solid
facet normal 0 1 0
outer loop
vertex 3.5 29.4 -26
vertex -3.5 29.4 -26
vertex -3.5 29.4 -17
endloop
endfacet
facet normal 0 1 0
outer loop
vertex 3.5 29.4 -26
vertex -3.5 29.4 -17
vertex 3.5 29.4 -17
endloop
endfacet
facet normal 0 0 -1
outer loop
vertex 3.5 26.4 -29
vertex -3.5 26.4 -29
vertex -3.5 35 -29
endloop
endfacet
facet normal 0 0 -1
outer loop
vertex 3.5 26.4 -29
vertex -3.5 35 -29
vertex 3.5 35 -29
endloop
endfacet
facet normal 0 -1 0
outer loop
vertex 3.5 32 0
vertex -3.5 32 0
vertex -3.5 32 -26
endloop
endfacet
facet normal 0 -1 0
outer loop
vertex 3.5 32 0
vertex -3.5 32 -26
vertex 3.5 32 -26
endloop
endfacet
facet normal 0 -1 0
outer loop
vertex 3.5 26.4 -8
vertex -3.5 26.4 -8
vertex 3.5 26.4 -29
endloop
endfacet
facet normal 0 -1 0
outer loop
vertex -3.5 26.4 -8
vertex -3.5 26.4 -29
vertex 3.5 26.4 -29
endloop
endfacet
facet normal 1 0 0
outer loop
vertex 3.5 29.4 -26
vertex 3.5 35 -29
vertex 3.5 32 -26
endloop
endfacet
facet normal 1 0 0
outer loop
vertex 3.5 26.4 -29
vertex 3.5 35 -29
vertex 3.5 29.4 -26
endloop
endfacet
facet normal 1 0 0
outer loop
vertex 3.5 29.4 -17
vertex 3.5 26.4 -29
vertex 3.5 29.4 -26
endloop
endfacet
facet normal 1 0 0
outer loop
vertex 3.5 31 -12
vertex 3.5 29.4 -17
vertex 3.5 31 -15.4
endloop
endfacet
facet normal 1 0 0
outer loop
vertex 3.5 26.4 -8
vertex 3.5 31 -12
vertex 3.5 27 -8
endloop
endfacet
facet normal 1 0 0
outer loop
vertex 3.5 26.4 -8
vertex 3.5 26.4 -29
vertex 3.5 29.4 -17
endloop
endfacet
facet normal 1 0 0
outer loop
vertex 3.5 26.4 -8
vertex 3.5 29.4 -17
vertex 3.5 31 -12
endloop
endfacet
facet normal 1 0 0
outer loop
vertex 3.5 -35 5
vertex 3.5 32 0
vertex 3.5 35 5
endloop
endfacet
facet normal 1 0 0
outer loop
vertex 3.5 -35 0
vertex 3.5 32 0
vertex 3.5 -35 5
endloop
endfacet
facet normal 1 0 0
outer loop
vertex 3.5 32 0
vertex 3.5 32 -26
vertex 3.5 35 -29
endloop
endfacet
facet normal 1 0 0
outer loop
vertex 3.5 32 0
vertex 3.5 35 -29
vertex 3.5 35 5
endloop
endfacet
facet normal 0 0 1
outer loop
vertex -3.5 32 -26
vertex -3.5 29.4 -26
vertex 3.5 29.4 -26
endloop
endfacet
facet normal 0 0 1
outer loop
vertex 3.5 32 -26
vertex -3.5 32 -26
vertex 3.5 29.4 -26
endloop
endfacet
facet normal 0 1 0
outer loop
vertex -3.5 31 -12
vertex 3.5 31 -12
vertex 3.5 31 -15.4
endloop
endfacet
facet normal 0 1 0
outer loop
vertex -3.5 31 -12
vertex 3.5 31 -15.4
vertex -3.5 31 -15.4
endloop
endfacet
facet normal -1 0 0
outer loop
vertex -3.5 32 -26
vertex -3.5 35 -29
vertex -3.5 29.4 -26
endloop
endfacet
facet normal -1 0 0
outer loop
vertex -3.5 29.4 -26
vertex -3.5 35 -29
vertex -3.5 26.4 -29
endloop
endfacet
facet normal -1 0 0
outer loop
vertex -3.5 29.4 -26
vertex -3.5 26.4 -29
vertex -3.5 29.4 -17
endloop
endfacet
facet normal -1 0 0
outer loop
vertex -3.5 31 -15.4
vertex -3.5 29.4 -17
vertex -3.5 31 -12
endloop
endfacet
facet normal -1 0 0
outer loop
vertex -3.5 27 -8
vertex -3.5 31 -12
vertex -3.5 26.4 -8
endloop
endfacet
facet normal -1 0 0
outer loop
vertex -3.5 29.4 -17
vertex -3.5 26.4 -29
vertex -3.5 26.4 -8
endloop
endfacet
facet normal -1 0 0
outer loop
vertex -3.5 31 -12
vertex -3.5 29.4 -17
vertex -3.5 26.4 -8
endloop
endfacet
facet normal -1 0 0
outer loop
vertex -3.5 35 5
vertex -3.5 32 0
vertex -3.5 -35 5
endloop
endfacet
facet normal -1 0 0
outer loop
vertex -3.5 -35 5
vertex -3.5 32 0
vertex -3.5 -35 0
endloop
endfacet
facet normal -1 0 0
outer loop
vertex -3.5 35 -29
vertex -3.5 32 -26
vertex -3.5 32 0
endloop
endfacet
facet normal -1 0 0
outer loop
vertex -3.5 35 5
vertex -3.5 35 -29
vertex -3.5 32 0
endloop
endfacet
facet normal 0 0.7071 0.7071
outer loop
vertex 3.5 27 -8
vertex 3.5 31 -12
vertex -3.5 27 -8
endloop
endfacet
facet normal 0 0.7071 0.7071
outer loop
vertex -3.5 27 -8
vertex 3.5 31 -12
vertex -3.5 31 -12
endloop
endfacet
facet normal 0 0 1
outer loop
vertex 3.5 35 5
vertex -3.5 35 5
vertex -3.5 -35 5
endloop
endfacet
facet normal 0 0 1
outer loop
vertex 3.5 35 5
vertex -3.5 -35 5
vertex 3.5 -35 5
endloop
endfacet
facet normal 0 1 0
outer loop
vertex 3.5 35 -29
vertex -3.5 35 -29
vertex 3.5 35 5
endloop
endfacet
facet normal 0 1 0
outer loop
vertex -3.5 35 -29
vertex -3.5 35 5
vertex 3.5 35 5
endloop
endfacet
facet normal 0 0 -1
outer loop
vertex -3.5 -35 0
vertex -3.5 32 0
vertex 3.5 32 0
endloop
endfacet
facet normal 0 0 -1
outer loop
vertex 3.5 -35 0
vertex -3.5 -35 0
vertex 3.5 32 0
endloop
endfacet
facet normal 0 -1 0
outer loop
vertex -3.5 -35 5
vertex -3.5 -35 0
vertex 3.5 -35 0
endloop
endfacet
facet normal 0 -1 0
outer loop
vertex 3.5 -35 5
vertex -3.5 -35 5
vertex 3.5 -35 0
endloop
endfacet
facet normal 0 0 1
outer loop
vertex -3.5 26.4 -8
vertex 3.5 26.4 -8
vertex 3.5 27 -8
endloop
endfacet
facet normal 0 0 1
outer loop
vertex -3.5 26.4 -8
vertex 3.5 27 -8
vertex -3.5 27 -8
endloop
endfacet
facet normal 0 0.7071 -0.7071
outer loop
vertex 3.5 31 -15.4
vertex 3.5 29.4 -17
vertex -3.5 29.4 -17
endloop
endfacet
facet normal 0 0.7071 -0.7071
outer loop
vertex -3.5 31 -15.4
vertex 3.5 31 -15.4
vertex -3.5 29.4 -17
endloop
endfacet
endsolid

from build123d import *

# Parameters (mm, degrees)
F0_W     = 7
F0_H     = 70
F1_DEPTH = 5
F2_W     = 7
F2_H     = 3
F3_DEPTH = 26
F4_W     = 7
F4_H     = 8.6
F5_DEPTH = 3
F6_W     = 7
F6_H     = 3
F7_DEPTH = 18
F8_W     = 7
F8_H     = 9
F9_DEPTH = 1.6
F10_SIZE = 4
F11_SIZE = 1.59999


# Not quite as in the source:
# - a fillet or chamfer is up to 0.001 mm smaller than in the source, because OpenCascade refuses the exact size


with BuildPart() as f1:
    # F0 (on Top) → F1 (new body)
    with BuildSketch(Plane.XY):
        Rectangle(F0_W, F0_H)
    extrude(amount=F1_DEPTH)

    # F2 (on face) → F3 (join)
    with BuildSketch(Plane(origin=(0, 0, 0), x_dir=(1, 0, 0), z_dir=(0, 0, -1))):
        with Locations((0, -33.5)):
            Rectangle(F2_W, F2_H)
    extrude(amount=F3_DEPTH)

    # F4 (on face) → F5 (join)
    with BuildSketch(Plane(origin=(0, 0, -26), x_dir=(1, 0, 0), z_dir=(0, 0, -1))):
        with Locations((0, -30.7)):
            Rectangle(F4_W, F4_H)
    extrude(amount=F5_DEPTH)

    # F6 (on face) → F7 (join)
    with BuildSketch(Plane.XY.offset(-26)):
        with Locations((0, 27.9)):
            Rectangle(F6_W, F6_H)
    extrude(amount=F7_DEPTH)

    # F8 (on face) → F9 (join)
    with BuildSketch(Plane(origin=(0, 29.4, 0), x_dir=(-1, 0, 0), z_dir=(0, 1, 0))):
        with Locations((0, -12.5)):
            Rectangle(F8_W, F8_H)
    extrude(amount=F9_DEPTH)

    # F10
    f10_edges = [f1.edges().sort_by_distance(p)[0] for p in [
        (0, 31, -8),
    ]]
    chamfer(f10_edges, length=F10_SIZE)

    # F11 (size 1.6 in the source; OpenCascade refuses exactly that, so slightly less here)
    f11_edges = [f1.edges().sort_by_distance(p)[0] for p in [
        (0, 31, -17),
    ]]
    chamfer(f11_edges, length=F11_SIZE)


solid = f1.part
